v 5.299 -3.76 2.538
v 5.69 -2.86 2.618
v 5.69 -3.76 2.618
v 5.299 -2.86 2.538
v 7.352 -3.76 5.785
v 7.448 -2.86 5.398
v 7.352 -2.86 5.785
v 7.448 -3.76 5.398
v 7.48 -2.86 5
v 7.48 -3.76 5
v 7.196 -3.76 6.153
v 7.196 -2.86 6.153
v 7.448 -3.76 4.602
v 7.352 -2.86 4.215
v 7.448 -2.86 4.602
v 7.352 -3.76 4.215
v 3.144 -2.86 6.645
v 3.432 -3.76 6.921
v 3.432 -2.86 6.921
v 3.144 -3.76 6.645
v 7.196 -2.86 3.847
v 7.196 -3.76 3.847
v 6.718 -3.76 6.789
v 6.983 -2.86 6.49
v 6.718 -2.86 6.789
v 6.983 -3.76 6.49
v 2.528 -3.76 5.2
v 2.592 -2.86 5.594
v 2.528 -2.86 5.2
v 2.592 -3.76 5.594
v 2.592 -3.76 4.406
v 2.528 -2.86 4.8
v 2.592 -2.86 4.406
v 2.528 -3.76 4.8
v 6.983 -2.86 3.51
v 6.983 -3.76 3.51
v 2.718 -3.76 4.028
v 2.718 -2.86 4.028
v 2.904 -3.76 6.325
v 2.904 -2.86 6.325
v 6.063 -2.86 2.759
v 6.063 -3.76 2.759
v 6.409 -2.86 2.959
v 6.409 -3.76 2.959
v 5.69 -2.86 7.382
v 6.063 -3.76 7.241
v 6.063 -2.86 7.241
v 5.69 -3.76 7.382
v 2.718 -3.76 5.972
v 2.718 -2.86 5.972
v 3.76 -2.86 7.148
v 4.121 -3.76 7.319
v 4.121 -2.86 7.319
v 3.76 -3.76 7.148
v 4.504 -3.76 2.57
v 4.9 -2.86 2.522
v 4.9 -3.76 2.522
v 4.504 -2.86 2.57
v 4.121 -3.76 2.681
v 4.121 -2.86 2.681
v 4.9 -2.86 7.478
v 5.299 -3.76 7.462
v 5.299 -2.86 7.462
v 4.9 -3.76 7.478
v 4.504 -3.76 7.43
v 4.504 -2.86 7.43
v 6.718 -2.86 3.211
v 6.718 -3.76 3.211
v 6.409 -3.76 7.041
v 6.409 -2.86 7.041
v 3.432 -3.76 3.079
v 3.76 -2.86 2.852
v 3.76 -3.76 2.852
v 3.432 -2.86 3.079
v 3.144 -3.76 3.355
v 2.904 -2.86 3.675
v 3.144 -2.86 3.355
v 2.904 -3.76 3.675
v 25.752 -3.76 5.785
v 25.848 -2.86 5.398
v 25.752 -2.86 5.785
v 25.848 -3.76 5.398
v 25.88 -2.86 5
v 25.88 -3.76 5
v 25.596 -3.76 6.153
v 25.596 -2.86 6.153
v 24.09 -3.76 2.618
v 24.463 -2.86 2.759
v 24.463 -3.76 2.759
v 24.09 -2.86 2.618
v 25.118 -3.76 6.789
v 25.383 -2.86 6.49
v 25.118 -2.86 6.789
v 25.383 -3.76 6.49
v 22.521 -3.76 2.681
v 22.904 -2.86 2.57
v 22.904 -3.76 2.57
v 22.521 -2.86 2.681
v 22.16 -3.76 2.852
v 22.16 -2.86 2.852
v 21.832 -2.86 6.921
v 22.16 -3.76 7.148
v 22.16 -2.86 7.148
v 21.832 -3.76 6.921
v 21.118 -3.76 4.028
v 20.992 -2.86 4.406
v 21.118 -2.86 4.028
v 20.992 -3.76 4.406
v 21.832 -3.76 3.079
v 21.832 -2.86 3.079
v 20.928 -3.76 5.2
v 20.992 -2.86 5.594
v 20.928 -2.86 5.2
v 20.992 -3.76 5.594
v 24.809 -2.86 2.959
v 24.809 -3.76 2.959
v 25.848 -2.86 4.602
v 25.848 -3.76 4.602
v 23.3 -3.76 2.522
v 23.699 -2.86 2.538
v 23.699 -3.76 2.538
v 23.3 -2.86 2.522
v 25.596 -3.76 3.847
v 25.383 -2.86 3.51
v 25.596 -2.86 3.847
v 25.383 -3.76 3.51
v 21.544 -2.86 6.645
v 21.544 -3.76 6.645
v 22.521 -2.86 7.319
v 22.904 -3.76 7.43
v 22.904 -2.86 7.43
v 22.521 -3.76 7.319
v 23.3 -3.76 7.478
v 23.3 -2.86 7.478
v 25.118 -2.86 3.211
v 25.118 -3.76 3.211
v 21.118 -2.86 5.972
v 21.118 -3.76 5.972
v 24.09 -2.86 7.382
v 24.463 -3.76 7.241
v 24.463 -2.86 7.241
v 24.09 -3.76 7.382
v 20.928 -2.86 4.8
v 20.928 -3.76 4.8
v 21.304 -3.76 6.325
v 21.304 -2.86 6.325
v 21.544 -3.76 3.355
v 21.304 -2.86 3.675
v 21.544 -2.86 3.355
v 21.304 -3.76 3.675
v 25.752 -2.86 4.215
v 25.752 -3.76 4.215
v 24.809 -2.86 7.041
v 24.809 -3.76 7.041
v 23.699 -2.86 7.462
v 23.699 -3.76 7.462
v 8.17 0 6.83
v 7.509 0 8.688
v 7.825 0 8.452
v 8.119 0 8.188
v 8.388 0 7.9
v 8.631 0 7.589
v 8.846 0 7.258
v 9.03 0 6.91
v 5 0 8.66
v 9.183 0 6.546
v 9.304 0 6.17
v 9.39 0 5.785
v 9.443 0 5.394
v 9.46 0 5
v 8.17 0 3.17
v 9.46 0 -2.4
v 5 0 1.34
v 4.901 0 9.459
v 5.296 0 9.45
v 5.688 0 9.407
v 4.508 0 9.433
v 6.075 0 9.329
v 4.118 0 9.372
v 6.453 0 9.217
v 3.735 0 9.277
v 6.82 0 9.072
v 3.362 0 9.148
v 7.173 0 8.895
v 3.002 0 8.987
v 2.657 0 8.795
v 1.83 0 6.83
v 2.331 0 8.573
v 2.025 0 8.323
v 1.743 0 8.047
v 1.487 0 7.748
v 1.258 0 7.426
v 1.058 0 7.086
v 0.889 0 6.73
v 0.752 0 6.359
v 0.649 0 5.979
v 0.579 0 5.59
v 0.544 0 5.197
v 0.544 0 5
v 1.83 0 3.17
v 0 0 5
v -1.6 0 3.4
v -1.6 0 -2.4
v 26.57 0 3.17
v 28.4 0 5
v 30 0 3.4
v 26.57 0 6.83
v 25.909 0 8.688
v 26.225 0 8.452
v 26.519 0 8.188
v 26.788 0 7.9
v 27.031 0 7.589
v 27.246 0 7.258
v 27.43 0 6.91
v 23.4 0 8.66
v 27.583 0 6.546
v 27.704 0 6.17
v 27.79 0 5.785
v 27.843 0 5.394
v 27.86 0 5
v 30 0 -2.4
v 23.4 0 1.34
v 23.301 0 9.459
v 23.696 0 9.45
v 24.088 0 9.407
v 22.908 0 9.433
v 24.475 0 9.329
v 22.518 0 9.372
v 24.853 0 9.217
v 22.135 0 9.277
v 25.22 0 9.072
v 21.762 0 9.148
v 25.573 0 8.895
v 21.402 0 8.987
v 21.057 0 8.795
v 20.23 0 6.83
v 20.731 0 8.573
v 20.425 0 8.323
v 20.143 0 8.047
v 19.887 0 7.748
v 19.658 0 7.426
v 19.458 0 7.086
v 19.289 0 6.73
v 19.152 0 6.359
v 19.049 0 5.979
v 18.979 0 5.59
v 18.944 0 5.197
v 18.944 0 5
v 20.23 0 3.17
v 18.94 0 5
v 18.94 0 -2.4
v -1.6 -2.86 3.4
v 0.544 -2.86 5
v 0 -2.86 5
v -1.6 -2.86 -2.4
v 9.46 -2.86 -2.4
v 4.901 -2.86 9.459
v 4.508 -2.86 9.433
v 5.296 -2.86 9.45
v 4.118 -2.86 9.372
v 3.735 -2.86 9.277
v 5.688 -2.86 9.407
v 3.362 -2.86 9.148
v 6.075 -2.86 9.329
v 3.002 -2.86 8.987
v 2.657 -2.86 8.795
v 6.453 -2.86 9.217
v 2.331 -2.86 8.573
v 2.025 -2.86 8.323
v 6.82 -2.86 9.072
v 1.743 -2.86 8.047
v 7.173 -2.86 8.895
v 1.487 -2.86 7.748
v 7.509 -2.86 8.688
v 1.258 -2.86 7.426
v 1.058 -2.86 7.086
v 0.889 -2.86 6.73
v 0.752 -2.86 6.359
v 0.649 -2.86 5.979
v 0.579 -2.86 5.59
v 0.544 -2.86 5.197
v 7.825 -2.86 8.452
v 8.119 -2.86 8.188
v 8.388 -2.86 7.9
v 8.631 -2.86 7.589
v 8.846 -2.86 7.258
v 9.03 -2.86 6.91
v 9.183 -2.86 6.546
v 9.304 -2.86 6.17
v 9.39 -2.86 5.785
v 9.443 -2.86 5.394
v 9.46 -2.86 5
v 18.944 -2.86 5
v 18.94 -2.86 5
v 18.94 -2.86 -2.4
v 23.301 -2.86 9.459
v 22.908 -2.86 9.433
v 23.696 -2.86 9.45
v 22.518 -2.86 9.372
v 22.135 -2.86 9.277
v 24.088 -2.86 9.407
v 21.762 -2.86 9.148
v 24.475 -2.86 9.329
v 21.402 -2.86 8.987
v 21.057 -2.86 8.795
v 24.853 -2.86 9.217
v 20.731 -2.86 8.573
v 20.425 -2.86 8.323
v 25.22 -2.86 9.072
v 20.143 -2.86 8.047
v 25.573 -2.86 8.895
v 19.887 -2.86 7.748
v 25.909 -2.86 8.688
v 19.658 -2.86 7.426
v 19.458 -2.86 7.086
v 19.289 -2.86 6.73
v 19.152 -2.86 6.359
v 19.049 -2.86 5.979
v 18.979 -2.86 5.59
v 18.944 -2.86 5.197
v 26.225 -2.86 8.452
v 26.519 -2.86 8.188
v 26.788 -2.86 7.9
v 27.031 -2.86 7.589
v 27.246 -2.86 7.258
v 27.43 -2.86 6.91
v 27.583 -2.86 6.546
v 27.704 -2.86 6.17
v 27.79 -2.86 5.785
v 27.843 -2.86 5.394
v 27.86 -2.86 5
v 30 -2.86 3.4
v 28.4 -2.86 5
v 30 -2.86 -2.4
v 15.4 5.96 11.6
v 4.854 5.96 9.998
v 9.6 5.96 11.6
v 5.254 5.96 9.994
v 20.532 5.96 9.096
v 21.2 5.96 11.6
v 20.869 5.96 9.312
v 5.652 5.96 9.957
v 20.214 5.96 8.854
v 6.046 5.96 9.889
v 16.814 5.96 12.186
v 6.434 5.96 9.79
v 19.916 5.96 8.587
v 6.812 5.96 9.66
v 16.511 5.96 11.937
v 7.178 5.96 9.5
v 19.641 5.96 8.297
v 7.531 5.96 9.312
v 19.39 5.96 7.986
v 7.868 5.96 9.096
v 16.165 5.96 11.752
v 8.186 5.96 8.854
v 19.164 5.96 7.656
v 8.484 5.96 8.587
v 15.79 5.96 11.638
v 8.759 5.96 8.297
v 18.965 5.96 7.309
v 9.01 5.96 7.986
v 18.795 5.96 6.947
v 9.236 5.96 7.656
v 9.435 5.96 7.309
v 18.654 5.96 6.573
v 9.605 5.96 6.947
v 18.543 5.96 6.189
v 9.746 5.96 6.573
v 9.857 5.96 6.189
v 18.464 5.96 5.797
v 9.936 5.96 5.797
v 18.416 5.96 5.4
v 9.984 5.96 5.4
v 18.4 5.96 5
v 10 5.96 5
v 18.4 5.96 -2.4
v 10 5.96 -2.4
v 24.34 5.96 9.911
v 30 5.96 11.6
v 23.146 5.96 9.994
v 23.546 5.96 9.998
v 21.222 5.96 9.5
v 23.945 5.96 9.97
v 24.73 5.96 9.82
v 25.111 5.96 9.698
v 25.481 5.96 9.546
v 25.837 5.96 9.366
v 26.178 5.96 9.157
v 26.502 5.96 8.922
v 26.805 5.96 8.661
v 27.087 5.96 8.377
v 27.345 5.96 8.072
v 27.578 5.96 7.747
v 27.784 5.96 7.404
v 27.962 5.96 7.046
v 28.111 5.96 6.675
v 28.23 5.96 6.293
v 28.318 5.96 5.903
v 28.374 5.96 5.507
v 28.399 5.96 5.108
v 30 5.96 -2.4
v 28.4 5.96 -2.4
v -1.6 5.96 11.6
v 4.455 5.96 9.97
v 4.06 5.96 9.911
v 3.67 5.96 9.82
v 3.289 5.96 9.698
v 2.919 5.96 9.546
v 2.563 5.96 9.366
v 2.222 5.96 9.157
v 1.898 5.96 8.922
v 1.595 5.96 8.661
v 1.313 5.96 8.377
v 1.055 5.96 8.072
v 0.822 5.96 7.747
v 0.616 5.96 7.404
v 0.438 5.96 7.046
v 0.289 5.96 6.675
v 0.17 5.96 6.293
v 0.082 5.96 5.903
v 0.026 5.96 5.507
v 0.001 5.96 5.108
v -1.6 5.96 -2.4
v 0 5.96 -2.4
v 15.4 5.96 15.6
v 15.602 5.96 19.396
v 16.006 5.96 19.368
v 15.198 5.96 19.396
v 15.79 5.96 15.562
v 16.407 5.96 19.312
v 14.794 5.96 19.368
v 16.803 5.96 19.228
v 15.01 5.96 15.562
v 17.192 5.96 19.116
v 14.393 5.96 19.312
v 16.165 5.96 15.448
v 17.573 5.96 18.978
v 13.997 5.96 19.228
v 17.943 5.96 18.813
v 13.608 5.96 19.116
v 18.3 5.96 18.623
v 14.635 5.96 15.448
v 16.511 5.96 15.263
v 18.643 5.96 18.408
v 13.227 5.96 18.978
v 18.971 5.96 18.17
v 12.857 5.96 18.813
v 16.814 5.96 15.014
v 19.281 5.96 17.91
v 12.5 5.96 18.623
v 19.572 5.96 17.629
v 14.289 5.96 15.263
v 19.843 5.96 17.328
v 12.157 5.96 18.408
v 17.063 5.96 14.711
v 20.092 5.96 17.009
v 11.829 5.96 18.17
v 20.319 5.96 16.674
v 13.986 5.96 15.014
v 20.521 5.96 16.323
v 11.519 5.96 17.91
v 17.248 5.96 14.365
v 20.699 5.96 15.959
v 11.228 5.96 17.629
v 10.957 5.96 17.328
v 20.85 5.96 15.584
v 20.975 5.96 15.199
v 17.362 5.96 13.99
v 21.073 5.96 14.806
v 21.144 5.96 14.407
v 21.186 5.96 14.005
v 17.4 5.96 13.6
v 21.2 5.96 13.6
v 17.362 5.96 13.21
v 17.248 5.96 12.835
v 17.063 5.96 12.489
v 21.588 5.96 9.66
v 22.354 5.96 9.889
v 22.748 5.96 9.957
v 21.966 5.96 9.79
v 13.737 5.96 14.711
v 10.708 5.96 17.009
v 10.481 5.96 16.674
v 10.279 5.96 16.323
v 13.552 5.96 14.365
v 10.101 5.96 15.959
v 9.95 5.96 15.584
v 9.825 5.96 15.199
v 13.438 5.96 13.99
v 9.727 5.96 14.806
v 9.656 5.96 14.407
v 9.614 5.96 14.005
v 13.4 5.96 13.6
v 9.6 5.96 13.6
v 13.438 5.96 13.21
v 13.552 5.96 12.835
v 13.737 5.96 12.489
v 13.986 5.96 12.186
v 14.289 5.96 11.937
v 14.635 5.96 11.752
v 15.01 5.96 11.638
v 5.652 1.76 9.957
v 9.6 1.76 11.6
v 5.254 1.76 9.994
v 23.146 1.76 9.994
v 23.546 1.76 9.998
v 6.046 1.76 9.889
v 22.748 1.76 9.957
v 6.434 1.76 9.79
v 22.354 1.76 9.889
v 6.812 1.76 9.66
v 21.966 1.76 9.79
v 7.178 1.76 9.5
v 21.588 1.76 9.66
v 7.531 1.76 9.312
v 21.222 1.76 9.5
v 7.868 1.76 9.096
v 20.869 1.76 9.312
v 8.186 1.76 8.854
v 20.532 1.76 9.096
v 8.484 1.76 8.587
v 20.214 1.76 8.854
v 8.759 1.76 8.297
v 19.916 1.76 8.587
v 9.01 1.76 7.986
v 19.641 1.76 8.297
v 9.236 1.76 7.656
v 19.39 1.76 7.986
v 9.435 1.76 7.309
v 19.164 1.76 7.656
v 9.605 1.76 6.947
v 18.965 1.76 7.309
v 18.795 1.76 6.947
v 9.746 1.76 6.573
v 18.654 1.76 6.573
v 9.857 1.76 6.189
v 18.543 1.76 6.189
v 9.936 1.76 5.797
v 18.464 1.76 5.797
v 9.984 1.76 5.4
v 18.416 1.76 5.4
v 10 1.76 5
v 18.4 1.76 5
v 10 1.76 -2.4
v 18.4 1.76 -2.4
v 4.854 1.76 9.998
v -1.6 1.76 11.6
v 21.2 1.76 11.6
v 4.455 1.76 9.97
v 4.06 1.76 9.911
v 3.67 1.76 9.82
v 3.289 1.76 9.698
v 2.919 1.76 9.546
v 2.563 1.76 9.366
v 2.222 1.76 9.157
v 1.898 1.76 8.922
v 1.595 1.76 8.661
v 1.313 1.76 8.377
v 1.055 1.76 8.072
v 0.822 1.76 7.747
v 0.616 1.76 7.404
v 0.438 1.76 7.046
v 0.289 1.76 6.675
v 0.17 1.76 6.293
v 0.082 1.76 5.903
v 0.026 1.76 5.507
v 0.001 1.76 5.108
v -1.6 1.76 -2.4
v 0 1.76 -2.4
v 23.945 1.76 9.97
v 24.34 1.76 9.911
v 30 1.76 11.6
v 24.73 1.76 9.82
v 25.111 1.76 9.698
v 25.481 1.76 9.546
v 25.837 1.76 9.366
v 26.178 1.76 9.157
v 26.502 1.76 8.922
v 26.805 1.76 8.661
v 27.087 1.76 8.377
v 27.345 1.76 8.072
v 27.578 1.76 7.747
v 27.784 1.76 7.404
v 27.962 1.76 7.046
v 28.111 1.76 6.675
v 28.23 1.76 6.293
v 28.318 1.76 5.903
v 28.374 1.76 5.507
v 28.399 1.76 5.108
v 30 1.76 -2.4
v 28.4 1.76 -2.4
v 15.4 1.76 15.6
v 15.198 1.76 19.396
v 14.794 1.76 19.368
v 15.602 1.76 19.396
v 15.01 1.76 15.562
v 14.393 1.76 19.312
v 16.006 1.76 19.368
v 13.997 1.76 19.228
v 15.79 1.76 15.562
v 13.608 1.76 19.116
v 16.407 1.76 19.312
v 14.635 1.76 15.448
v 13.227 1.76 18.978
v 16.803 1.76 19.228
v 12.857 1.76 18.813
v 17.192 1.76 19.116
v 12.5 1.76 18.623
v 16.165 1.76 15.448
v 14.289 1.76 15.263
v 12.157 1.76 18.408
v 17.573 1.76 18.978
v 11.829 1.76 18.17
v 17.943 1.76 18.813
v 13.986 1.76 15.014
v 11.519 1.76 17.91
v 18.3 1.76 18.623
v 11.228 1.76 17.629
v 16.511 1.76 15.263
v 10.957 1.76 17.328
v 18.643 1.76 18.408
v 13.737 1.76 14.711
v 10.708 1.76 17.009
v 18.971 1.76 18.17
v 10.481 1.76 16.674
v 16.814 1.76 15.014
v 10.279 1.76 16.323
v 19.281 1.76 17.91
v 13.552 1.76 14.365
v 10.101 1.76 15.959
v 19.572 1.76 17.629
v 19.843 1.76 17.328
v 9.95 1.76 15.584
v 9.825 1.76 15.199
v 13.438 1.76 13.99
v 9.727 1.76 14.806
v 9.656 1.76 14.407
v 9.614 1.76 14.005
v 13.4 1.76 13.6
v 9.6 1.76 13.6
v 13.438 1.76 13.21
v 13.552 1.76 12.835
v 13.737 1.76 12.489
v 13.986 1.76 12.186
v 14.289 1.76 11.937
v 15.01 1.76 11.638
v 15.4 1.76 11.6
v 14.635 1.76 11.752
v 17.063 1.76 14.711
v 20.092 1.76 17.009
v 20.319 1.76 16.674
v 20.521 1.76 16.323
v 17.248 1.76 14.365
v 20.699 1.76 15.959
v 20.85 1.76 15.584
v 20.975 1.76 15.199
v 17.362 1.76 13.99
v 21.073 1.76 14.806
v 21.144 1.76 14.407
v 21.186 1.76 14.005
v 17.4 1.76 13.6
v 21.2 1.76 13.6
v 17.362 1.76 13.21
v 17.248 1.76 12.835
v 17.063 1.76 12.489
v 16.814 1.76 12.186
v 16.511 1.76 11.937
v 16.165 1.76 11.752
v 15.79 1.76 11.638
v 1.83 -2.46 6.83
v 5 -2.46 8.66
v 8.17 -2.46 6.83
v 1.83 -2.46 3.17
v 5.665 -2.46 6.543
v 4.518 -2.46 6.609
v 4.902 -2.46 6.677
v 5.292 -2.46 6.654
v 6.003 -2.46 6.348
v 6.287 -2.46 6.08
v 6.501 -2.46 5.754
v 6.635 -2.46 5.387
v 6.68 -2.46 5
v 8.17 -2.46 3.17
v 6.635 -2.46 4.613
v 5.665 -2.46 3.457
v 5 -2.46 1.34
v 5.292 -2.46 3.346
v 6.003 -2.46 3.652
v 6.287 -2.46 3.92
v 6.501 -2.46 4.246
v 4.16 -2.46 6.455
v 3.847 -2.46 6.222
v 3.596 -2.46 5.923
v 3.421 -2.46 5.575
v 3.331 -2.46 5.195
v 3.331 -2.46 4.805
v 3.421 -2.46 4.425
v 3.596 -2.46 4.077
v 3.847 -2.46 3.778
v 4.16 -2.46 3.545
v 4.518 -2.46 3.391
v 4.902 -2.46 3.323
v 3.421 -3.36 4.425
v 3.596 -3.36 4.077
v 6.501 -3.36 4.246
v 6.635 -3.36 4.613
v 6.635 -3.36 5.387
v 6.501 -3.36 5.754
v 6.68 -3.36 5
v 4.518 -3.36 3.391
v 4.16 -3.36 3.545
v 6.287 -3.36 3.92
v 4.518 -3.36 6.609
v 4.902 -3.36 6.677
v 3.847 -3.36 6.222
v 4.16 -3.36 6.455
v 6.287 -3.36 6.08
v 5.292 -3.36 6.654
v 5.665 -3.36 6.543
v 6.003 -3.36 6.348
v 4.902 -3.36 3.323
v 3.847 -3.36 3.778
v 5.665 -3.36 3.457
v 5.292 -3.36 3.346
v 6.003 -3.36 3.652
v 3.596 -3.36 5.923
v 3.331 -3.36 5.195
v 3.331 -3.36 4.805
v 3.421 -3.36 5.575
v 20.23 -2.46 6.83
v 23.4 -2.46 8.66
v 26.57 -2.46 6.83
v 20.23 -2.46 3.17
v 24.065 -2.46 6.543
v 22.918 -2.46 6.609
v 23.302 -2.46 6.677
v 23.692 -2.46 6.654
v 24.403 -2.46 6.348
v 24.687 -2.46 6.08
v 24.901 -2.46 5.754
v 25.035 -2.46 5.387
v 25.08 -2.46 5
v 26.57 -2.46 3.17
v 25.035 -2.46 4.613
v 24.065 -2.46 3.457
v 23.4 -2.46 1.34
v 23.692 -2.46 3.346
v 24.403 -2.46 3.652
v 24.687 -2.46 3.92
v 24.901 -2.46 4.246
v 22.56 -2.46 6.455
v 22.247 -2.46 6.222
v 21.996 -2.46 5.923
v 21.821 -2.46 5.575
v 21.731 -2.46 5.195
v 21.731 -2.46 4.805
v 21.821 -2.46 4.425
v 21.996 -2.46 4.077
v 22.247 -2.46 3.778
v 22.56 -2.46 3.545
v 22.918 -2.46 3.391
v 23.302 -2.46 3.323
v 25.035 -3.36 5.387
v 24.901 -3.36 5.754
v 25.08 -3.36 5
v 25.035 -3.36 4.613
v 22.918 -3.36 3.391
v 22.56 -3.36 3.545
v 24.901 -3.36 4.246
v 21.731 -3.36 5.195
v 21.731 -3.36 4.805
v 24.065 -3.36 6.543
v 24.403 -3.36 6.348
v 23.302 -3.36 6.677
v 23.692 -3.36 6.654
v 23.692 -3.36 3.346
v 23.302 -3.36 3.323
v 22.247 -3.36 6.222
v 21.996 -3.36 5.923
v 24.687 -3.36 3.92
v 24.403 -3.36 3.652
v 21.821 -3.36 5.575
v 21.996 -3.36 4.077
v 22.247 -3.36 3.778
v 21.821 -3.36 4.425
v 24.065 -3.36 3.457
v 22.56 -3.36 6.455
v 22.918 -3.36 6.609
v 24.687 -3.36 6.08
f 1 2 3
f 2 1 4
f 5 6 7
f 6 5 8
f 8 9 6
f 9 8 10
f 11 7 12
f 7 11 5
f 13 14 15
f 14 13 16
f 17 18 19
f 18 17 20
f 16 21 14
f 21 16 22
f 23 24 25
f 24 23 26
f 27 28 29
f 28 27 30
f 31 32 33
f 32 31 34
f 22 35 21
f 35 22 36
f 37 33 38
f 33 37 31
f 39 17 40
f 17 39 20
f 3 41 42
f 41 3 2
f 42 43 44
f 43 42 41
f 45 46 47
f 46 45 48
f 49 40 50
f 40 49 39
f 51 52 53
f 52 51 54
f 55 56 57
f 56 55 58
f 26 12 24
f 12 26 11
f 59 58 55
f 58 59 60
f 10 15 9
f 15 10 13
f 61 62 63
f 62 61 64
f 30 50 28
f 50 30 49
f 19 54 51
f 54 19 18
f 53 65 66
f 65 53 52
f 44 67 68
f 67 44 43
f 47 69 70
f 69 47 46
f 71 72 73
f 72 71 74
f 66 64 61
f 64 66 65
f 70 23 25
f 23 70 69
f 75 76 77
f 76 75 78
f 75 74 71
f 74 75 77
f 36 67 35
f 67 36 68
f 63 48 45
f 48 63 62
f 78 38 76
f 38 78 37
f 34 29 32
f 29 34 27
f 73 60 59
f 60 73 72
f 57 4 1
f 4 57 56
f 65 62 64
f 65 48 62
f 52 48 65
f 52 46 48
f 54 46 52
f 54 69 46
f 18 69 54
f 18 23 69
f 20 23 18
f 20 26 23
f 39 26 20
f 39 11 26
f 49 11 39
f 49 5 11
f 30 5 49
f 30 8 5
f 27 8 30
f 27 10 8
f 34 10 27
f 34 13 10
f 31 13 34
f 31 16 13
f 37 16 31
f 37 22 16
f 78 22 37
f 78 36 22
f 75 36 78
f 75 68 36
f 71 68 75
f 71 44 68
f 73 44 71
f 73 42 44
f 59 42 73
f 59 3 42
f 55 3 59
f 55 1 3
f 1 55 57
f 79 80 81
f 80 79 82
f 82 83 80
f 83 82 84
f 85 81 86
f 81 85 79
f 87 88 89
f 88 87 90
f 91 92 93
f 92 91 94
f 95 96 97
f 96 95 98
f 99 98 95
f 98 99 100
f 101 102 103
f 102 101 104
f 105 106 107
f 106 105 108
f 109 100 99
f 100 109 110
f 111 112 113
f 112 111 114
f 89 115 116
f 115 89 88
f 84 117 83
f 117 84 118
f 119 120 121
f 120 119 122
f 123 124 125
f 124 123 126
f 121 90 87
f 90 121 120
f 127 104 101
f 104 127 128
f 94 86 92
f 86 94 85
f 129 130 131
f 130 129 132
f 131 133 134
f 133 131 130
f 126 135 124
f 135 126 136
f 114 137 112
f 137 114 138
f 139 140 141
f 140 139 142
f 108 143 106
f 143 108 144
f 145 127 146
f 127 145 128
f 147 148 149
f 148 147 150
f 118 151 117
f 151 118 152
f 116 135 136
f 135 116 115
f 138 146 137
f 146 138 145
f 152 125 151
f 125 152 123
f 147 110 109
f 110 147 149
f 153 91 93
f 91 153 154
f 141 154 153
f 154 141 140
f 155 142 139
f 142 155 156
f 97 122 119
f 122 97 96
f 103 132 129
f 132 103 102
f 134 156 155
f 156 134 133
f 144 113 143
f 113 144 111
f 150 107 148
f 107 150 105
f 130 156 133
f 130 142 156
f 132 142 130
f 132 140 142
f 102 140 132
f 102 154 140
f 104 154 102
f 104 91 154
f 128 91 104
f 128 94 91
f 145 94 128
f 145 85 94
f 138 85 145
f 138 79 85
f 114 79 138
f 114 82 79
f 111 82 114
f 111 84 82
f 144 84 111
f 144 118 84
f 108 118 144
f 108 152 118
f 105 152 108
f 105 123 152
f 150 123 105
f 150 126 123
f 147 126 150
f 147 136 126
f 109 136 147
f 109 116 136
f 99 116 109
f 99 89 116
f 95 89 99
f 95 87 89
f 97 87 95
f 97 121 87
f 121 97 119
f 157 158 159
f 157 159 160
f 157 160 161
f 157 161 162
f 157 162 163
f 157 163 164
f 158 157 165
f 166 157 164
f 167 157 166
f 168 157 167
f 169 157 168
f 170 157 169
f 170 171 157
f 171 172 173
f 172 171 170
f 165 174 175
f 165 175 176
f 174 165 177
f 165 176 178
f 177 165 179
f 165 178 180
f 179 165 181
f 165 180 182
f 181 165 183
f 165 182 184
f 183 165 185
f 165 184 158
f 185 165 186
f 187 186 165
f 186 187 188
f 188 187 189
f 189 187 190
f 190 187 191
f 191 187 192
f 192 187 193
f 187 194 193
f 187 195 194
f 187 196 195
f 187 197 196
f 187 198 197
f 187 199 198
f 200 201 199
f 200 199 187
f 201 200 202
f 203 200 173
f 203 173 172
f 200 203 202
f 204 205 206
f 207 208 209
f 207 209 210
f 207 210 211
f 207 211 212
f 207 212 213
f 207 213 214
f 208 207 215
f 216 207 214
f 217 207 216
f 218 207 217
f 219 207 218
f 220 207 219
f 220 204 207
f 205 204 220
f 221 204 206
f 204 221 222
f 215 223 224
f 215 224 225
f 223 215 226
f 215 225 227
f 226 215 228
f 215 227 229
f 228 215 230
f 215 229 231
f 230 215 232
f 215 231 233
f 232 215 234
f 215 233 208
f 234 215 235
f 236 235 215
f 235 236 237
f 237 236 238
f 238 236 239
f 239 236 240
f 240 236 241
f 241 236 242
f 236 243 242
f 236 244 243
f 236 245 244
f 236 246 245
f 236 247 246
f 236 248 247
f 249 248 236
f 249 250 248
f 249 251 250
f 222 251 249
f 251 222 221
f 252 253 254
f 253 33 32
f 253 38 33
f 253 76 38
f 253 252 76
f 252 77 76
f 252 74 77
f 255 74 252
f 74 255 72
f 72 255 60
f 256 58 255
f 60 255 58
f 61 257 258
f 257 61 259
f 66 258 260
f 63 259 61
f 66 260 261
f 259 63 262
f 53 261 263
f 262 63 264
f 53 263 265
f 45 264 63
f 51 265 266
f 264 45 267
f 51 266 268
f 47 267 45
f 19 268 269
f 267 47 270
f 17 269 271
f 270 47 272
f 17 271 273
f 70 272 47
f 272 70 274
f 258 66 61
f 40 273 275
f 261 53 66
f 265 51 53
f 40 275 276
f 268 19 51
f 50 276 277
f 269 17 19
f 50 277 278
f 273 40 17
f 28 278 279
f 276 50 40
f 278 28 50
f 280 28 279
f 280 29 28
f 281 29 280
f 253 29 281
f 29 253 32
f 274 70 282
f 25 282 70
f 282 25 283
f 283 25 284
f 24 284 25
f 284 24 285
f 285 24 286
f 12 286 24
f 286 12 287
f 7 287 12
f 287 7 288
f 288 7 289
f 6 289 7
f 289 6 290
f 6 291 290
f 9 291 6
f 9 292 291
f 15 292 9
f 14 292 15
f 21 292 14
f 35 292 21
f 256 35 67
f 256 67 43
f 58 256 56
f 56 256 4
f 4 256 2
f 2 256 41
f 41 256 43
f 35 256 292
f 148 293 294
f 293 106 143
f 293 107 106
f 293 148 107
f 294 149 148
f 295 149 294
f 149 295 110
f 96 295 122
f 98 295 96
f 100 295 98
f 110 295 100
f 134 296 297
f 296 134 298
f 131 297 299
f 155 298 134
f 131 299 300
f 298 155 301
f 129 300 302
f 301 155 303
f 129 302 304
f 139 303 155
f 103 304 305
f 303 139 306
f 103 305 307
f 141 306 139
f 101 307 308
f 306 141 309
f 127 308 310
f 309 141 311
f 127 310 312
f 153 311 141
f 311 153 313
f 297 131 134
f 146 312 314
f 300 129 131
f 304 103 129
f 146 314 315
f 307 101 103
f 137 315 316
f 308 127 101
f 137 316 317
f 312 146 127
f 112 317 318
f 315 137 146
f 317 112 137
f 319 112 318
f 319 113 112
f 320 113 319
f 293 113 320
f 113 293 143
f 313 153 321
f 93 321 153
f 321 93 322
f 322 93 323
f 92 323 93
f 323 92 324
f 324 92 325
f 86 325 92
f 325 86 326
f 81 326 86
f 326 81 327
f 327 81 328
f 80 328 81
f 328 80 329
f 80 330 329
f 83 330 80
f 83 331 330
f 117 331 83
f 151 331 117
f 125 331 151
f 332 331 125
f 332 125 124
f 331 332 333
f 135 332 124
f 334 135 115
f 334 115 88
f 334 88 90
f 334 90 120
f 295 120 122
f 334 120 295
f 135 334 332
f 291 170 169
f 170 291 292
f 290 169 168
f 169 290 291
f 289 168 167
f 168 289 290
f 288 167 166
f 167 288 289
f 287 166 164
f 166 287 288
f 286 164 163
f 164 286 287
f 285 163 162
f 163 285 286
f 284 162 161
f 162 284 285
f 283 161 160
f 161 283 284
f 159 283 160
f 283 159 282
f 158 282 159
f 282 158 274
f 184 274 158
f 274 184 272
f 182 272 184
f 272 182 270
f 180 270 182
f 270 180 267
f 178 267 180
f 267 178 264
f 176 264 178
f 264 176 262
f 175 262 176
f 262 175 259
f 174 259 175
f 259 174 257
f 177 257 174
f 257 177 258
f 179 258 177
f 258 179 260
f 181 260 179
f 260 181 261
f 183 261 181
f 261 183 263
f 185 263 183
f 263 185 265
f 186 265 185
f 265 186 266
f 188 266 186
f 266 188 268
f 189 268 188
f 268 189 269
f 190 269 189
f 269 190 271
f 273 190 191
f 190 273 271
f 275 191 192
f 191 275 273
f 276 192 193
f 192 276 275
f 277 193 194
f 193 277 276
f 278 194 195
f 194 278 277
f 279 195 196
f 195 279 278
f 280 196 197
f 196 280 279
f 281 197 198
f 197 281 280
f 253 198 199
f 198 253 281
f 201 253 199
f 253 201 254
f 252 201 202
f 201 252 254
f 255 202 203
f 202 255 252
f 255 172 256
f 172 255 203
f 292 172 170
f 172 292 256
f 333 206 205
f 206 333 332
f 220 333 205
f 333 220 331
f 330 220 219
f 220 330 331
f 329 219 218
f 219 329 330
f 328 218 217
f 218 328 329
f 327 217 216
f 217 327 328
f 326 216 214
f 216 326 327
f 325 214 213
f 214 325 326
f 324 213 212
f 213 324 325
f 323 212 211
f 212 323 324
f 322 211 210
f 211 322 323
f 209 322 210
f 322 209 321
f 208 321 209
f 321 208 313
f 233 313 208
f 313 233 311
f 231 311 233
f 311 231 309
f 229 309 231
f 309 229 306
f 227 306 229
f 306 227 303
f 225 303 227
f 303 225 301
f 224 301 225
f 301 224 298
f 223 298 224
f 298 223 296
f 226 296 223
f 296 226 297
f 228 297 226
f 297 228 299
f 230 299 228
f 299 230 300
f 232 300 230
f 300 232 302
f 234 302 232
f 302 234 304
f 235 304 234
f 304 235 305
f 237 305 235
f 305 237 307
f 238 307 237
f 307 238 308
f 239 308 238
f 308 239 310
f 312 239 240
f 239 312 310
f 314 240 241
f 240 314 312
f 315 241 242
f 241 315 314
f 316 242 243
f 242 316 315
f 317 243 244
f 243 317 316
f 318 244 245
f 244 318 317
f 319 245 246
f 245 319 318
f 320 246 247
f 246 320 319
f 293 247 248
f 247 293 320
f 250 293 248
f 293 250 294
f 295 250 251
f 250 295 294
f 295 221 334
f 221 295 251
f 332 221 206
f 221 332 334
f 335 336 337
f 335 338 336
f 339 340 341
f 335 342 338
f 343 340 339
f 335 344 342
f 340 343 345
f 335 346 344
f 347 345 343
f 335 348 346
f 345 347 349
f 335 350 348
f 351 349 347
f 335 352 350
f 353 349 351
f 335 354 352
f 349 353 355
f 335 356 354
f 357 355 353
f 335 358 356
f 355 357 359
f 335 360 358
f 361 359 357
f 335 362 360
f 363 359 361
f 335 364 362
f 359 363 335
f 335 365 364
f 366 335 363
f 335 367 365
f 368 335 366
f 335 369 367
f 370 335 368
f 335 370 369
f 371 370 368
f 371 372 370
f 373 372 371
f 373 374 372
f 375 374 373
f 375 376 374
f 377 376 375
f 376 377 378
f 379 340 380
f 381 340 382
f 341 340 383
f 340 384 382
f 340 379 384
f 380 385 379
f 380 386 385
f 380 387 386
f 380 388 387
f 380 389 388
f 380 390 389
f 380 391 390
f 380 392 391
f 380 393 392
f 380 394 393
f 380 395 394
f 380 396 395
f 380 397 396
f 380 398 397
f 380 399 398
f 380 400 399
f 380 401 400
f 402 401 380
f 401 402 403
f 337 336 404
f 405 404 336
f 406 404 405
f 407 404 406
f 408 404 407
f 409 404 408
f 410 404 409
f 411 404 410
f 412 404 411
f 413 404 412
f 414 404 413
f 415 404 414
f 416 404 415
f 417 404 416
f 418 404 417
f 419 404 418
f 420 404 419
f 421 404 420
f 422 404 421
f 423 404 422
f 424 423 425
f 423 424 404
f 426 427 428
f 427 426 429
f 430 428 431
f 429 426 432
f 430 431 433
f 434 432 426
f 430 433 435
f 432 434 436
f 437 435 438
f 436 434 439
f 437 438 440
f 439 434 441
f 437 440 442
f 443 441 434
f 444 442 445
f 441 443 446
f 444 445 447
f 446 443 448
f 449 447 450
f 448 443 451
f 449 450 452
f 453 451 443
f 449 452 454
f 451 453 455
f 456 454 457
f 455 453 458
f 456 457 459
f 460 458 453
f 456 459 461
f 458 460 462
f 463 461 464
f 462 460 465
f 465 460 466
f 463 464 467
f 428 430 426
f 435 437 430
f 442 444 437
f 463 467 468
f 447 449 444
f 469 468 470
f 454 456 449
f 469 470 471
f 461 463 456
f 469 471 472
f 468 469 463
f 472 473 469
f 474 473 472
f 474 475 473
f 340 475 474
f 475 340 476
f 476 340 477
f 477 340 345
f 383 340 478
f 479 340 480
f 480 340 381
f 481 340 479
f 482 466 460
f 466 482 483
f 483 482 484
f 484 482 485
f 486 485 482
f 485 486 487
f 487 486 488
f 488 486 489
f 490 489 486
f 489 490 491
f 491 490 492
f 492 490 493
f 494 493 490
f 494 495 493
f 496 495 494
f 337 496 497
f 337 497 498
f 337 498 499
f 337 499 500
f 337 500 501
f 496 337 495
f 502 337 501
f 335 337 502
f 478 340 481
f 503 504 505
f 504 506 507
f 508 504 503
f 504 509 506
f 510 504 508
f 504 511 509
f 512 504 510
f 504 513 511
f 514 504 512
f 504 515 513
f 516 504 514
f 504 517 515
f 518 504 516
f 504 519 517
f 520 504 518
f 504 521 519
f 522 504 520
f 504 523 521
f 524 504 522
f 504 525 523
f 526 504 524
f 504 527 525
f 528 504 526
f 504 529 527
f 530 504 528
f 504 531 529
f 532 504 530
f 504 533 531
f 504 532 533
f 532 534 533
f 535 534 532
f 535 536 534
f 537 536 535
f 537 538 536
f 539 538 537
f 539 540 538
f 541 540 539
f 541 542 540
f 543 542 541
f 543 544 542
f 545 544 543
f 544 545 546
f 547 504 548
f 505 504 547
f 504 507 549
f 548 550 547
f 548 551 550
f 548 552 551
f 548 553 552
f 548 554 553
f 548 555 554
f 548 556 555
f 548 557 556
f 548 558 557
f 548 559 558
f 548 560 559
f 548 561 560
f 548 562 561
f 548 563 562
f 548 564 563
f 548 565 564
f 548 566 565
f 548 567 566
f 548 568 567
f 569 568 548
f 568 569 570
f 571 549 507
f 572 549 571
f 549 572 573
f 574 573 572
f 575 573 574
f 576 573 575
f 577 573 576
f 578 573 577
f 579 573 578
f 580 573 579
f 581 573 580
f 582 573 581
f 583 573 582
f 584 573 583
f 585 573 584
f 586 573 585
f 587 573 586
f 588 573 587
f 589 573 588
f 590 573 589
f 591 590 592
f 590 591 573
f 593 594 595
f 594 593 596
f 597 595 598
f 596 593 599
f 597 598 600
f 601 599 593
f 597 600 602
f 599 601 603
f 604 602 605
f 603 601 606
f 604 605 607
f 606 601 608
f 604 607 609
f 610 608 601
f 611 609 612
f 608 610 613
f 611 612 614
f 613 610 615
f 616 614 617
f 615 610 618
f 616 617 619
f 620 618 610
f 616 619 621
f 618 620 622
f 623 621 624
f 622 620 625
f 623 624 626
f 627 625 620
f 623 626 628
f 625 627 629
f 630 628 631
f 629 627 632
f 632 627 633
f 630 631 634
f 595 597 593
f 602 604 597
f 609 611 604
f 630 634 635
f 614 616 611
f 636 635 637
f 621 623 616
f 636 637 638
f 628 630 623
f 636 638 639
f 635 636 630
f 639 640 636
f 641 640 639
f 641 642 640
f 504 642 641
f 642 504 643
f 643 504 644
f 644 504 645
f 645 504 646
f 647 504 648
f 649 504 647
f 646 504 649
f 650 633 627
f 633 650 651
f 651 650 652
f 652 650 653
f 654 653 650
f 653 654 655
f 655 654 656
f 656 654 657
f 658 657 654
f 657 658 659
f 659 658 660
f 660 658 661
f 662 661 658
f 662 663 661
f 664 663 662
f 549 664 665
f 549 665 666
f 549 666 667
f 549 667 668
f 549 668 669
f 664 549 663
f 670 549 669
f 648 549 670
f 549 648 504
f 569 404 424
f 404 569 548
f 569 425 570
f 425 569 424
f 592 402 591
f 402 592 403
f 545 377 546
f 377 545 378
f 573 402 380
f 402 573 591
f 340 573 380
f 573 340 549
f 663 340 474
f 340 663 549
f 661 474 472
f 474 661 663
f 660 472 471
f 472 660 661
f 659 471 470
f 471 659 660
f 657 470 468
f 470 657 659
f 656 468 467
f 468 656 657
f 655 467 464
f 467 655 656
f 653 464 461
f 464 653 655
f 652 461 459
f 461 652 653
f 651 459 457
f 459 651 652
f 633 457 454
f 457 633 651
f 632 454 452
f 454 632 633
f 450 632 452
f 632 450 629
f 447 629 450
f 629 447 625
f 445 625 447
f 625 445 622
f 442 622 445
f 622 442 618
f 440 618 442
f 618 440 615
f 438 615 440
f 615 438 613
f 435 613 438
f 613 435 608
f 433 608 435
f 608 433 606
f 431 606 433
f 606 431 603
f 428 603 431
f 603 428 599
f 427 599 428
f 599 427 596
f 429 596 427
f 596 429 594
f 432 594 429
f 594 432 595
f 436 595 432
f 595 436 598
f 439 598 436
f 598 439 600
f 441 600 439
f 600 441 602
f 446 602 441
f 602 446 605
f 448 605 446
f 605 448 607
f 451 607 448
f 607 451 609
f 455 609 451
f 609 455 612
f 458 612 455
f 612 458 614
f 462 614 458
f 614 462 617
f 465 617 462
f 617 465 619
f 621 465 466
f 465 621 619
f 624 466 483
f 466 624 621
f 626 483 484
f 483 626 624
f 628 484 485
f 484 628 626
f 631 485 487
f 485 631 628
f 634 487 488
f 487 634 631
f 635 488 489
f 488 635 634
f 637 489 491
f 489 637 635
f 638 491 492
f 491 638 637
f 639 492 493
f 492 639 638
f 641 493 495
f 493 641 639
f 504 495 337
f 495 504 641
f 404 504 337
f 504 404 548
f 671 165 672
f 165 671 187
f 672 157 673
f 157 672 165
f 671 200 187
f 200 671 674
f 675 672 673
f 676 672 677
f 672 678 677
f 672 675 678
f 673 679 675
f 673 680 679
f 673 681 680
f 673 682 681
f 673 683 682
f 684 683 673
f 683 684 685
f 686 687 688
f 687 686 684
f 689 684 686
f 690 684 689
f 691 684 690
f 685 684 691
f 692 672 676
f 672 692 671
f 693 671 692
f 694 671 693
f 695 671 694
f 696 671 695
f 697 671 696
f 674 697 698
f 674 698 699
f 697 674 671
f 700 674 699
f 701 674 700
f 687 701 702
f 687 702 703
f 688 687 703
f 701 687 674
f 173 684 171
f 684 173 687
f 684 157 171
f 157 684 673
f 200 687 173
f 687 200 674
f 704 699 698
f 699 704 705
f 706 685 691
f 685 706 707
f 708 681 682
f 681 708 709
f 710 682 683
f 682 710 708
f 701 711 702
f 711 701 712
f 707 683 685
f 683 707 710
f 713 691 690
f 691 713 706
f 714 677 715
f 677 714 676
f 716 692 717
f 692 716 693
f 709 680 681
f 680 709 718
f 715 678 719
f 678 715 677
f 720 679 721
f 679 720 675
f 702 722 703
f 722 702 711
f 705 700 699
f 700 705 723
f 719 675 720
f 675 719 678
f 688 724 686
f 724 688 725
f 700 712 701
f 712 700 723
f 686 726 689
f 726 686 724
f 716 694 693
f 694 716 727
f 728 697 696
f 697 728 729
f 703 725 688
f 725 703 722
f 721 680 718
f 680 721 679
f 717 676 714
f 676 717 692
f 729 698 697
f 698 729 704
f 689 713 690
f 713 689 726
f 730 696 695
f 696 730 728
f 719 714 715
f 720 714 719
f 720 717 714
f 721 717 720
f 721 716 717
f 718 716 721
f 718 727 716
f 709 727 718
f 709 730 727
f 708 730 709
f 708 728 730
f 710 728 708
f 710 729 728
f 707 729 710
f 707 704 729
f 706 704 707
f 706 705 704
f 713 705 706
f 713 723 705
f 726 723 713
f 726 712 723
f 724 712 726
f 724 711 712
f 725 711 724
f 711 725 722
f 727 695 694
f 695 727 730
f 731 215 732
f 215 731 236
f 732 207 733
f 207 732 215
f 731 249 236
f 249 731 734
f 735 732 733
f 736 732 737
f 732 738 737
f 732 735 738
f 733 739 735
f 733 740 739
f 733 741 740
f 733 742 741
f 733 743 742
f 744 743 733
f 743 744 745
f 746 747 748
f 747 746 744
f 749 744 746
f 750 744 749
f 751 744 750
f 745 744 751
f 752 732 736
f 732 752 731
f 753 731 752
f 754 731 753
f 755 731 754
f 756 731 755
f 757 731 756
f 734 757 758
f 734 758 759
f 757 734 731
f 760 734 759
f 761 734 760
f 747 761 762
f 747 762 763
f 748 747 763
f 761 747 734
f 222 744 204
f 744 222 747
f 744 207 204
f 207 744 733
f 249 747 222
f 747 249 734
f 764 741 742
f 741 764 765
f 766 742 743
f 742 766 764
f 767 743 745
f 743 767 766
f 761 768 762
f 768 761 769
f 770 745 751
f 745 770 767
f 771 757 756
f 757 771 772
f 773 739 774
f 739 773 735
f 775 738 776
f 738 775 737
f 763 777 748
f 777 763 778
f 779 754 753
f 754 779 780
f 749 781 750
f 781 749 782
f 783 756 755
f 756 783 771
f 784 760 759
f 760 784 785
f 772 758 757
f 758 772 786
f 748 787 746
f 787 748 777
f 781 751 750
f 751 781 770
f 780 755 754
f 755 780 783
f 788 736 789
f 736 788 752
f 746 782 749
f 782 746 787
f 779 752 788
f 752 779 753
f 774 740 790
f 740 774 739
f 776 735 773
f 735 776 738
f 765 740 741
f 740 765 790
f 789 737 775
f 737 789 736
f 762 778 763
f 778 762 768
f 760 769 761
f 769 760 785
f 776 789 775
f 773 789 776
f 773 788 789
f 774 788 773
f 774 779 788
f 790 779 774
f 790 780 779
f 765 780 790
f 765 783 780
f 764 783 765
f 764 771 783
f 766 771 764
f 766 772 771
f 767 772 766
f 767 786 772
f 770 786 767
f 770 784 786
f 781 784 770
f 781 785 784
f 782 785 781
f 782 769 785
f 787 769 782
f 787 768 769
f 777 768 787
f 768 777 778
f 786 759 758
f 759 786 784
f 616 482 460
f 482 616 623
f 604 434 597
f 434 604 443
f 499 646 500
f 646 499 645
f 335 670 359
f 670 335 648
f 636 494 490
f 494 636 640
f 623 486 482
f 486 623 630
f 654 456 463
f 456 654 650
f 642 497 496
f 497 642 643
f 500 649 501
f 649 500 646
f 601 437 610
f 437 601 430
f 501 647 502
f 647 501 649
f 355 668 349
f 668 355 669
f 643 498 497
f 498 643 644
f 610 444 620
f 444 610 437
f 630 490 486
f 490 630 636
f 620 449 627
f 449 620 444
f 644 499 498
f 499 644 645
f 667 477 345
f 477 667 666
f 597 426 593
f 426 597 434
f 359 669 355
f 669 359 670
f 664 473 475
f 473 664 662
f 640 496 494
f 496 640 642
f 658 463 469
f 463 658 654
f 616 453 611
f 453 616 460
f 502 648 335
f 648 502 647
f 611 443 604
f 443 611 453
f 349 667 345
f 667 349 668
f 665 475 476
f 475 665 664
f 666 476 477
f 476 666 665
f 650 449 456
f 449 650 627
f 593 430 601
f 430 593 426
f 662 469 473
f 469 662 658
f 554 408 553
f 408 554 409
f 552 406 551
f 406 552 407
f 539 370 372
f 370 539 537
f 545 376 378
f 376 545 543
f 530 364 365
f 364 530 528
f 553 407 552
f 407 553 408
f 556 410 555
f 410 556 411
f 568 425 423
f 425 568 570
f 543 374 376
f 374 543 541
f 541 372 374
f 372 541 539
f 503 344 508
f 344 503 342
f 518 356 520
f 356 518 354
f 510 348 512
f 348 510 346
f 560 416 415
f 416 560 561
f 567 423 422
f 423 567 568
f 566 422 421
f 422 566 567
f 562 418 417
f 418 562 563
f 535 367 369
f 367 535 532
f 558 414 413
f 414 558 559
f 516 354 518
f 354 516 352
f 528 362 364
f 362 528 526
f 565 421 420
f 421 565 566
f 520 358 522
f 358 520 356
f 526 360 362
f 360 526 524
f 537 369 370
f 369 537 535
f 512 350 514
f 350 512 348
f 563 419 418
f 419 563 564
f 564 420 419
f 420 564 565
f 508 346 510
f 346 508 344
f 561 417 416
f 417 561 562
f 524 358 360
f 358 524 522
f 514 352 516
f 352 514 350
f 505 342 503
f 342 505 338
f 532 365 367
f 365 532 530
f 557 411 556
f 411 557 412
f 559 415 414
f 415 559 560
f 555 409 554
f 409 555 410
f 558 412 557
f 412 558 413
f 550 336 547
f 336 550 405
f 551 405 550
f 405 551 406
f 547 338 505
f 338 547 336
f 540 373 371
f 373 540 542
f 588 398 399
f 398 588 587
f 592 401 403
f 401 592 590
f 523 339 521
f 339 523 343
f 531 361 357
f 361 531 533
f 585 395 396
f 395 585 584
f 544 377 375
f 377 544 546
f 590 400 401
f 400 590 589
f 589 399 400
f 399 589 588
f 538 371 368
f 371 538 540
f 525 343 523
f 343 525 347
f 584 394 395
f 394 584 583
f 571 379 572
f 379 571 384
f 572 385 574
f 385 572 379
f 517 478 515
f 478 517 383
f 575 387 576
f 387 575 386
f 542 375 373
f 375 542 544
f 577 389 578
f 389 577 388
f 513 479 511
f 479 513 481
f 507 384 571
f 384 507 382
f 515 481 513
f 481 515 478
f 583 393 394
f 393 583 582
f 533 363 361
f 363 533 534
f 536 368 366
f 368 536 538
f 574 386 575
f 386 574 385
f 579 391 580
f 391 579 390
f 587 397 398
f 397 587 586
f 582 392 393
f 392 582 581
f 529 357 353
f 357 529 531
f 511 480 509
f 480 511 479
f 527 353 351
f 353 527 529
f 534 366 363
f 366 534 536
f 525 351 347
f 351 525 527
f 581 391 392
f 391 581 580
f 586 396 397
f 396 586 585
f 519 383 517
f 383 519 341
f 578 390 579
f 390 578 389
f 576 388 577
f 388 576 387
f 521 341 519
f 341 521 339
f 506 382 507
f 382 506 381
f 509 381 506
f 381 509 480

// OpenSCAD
// Copyright (C) 2025 Arif K. Rafiq
// This program is free software: you can redistribute it and/or modify
// it under the terms of the GNU General Public License as published by
// the Free Software Foundation, either version 3 of the License, or
// (at your option) any later version.

// This program is distributed in the hope that it will be useful,
// but WITHOUT ANY WARRANTY; without even the implied warranty of
// MERCHANTABILITY or FITNESS FOR A PARTICULAR PURPOSE.  See the
// GNU General Public License for more details.

// You should have received a copy of the GNU General Public License
// along with this file.  If not, see <https://www.gnu.org/licenses/>,
// or write to: license@temperedoptimism.com


/* 
(b)readth       :(w)est (X-)   (c)enter (X0) (e)east (X+)
(h)eight        :(d)own (Z-)   (g)round(Z0)  (u)p (Z+)

Vectors (v)     :(x), (y), (z)
Thicknesses (t) : Thicknesses to resolve 3D printer limits or rendering issues.
Proportion (p)  : container for grouping (r)adius and (i)ntensity into a singl 2d vector acccessed using .x and .y respectively
*/
/* 17:08 */
// Fixed in example3.scad       // Set limits in customizer
/* [Thicknesses (x),(y),(z)] */
tFitGap = [0.16, 0.16, 0.16];   //[0.00:0.01:0.64] 
tWallMin = [0.40, 0.40, 0.16];  //[0.16:0.08:1.60] 
/* [Proportional (x):(Radius, (y):(i)ntensity] */
pHexSink = [3.5, 2.3];          //[0.10:0.02:20.00] 
pFastShaft064 = [1.36, 5.80]; //0.10:0.02:20.00]
pFastShaft095 = [1.36, 9.30]; //0.10:0.02:20.00]
pWashSink = [4.00, 1.00]; //0.10:0.02:20.00]
/* [2D vectors (x), (y)] */
vTerminalW = [5.0, 5.0];     //[0.00:0.10:100] 
vTerminalE = [23.4, 5.0];    //[0.00:0.10:100]
vThermal = [ 15.4, 13.6];    //[0.00:0.10:100.00]
/* [Scalars] */
leadingEdge = 2.4; //[0.8:0.4:5.0]
flankEdge = 1.6; //[0.8:0.4:5.0]
trailingEdge = 1.6; //[0.8:0.4:3.6]
bBoard = 28.4; //[20:0.1:100.0]
hBoard = 1.6; //0.8:04:3.2]
// Adding space
hSpacer = 4.2; //[2.8:0.4:14]
rCorner = 1.6; //0.1
rTerminal = 5.0; //0.1
rThermal = 5.0;  //0.1
/* [Special ] */
fa0 = 4.0;     //[1:1:60]  
fs0 = 0.4;     //[0.1:0.1:4.0]  
fx0 = 3;       //[1,2,3,4,5,6,7,8,9,10]
/* [Hidden] */ 
tEps=0.01; 

/* Calucualted at run time. */
pHexSurround = [pHexSink.x + (tWallMin.x * 2) + tFitGap.x, pHexSink.y + tWallMin.y + tFitGap.y];
pExtension = [pFastShaft064.x + ((tWallMin.x + tFitGap.x)* 2), pFastShaft064.y + tWallMin.y + tFitGap.y - pHexSurround.y -hBoard - pWashSink.y];

//30.00-35.00 Circles, Also look at the customizer!!
// Rotate
rotate([90,0,0]){
  difference(){
    union() {
      // hex pocket surround
      linear_extrude(pHexSurround.y, convexity=fx0){ 
        polygon([[vTerminalW.x + pHexSurround.x, vTerminalW.y],
              [ vTerminalW.x + pHexSurround.x, -leadingEdge],
              [-flankEdge, -leadingEdge],
              [-flankEdge, vTerminalW.y - rCorner],
              [-flankEdge + rCorner, vTerminalW.y]]);
        polygon([[vTerminalE.x - pHexSurround.x, vTerminalE.y],
              [ vTerminalE.x - pHexSurround.x, -leadingEdge],
              [bBoard + flankEdge, -leadingEdge],
              [bBoard + flankEdge, vTerminalE.y - rCorner],
              [bBoard + flankEdge - rCorner, vTerminalE.y]]);       
              
        for(v = [vTerminalW, vTerminalE]){
          translate(v)  circle(pHexSurround.x, $fa=fa0, $fs=fs0 );
        }
      }
      // shaft extension
      for(v= [vTerminalW, vTerminalE]){
          translate([v.x, v.y, pHexSurround.y - tEps]) cylinder(pExtension.y + tEps, r=pExtension.x, $fa=fa0, $fs=fs0);
      }
      // board spacer
      translate([0, 0, -hBoard - tFitGap.y - hSpacer]) linear_extrude(hSpacer, convexity=fx0){
          polygon([[-flankEdge, -leadingEdge],
          [bBoard + flankEdge, -leadingEdge],
          [bBoard + flankEdge, vTerminalE.y + rTerminal + trailingEdge],
          [vThermal.x + rThermal +(tWallMin.x * 2), vTerminalE.y + rTerminal + trailingEdge],
          [vThermal.x + rThermal +(tWallMin.x * 2), vThermal.y],
          [vThermal.x - rThermal -(tWallMin.x * 2), vThermal.y],
          [vThermal.x - rThermal -(tWallMin.x * 2), vTerminalW.y + rTerminal + trailingEdge],
          [-flankEdge, vTerminalW.y + rTerminal + trailingEdge]]);
          translate(vThermal) circle(rThermal + (tWallMin.x * 2), $fa=fa0, $fs=fs0);
      }
          
    }
    for(v = [vTerminalW, vTerminalE]){
        // hex pocket
        #translate([v.x, v.y, -tEps]) rotate([0,0,30]) cylinder(pHexSurround.y - tWallMin.y + tEps, r=pHexSurround.x - (tWallMin.x * 2), $fn=6);
        // fastner hole
        #translate([v.x, v.y, -hBoard -pWashSink.y]) cylinder(pFastShaft064.y + tFitGap.y, r=pFastShaft064.x + (tFitGap.x * 2), $fa=fa0, $fs=fs0);
     
    }
   #translate([vThermal.x, vThermal.y, -hBoard + pWashSink.y]) rotate([0,180,0]) 
        cylinder(pFastShaft095.y + tFitGap.y, r=pFastShaft095.x + (tFitGap.x * 4), $fa=fa0, $fs=fs0);

    // terminal guide
   #translate([vTerminalW.x, vTerminalW.y, -hBoard - tFitGap.y -hSpacer -tEps ]) linear_extrude(hSpacer + (tEps *2), convexity=fx0) {
        polygon([for(a = [0:max(fa0, (fs0*360)/(2*PI*rTerminal)):180]) [rTerminal * cos(a), rTerminal *sin(a)]
        ,[-rTerminal, -vTerminalW.y -leadingEdge -tEps]
        ,[rTerminal, -vTerminalW.y -leadingEdge -tEps]]);
   }
   /* Mirror */
   #translate([vTerminalE.x, vTerminalE.y, -hBoard - tFitGap.y -hSpacer -tEps ]) linear_extrude(hSpacer + (tEps *2), convexity=fx0) {
        mirror([1,0,0]) 
        polygon([for(a = [0:max(fa0, (fs0*360)/(2*PI*rTerminal)):180]) [rTerminal * cos(a), rTerminal *sin(a)]
        ,[-rTerminal, -vTerminalW.y -leadingEdge -tEps]
        ,[rTerminal, -vTerminalW.y -leadingEdge -tEps]]);
   }
  }
}
